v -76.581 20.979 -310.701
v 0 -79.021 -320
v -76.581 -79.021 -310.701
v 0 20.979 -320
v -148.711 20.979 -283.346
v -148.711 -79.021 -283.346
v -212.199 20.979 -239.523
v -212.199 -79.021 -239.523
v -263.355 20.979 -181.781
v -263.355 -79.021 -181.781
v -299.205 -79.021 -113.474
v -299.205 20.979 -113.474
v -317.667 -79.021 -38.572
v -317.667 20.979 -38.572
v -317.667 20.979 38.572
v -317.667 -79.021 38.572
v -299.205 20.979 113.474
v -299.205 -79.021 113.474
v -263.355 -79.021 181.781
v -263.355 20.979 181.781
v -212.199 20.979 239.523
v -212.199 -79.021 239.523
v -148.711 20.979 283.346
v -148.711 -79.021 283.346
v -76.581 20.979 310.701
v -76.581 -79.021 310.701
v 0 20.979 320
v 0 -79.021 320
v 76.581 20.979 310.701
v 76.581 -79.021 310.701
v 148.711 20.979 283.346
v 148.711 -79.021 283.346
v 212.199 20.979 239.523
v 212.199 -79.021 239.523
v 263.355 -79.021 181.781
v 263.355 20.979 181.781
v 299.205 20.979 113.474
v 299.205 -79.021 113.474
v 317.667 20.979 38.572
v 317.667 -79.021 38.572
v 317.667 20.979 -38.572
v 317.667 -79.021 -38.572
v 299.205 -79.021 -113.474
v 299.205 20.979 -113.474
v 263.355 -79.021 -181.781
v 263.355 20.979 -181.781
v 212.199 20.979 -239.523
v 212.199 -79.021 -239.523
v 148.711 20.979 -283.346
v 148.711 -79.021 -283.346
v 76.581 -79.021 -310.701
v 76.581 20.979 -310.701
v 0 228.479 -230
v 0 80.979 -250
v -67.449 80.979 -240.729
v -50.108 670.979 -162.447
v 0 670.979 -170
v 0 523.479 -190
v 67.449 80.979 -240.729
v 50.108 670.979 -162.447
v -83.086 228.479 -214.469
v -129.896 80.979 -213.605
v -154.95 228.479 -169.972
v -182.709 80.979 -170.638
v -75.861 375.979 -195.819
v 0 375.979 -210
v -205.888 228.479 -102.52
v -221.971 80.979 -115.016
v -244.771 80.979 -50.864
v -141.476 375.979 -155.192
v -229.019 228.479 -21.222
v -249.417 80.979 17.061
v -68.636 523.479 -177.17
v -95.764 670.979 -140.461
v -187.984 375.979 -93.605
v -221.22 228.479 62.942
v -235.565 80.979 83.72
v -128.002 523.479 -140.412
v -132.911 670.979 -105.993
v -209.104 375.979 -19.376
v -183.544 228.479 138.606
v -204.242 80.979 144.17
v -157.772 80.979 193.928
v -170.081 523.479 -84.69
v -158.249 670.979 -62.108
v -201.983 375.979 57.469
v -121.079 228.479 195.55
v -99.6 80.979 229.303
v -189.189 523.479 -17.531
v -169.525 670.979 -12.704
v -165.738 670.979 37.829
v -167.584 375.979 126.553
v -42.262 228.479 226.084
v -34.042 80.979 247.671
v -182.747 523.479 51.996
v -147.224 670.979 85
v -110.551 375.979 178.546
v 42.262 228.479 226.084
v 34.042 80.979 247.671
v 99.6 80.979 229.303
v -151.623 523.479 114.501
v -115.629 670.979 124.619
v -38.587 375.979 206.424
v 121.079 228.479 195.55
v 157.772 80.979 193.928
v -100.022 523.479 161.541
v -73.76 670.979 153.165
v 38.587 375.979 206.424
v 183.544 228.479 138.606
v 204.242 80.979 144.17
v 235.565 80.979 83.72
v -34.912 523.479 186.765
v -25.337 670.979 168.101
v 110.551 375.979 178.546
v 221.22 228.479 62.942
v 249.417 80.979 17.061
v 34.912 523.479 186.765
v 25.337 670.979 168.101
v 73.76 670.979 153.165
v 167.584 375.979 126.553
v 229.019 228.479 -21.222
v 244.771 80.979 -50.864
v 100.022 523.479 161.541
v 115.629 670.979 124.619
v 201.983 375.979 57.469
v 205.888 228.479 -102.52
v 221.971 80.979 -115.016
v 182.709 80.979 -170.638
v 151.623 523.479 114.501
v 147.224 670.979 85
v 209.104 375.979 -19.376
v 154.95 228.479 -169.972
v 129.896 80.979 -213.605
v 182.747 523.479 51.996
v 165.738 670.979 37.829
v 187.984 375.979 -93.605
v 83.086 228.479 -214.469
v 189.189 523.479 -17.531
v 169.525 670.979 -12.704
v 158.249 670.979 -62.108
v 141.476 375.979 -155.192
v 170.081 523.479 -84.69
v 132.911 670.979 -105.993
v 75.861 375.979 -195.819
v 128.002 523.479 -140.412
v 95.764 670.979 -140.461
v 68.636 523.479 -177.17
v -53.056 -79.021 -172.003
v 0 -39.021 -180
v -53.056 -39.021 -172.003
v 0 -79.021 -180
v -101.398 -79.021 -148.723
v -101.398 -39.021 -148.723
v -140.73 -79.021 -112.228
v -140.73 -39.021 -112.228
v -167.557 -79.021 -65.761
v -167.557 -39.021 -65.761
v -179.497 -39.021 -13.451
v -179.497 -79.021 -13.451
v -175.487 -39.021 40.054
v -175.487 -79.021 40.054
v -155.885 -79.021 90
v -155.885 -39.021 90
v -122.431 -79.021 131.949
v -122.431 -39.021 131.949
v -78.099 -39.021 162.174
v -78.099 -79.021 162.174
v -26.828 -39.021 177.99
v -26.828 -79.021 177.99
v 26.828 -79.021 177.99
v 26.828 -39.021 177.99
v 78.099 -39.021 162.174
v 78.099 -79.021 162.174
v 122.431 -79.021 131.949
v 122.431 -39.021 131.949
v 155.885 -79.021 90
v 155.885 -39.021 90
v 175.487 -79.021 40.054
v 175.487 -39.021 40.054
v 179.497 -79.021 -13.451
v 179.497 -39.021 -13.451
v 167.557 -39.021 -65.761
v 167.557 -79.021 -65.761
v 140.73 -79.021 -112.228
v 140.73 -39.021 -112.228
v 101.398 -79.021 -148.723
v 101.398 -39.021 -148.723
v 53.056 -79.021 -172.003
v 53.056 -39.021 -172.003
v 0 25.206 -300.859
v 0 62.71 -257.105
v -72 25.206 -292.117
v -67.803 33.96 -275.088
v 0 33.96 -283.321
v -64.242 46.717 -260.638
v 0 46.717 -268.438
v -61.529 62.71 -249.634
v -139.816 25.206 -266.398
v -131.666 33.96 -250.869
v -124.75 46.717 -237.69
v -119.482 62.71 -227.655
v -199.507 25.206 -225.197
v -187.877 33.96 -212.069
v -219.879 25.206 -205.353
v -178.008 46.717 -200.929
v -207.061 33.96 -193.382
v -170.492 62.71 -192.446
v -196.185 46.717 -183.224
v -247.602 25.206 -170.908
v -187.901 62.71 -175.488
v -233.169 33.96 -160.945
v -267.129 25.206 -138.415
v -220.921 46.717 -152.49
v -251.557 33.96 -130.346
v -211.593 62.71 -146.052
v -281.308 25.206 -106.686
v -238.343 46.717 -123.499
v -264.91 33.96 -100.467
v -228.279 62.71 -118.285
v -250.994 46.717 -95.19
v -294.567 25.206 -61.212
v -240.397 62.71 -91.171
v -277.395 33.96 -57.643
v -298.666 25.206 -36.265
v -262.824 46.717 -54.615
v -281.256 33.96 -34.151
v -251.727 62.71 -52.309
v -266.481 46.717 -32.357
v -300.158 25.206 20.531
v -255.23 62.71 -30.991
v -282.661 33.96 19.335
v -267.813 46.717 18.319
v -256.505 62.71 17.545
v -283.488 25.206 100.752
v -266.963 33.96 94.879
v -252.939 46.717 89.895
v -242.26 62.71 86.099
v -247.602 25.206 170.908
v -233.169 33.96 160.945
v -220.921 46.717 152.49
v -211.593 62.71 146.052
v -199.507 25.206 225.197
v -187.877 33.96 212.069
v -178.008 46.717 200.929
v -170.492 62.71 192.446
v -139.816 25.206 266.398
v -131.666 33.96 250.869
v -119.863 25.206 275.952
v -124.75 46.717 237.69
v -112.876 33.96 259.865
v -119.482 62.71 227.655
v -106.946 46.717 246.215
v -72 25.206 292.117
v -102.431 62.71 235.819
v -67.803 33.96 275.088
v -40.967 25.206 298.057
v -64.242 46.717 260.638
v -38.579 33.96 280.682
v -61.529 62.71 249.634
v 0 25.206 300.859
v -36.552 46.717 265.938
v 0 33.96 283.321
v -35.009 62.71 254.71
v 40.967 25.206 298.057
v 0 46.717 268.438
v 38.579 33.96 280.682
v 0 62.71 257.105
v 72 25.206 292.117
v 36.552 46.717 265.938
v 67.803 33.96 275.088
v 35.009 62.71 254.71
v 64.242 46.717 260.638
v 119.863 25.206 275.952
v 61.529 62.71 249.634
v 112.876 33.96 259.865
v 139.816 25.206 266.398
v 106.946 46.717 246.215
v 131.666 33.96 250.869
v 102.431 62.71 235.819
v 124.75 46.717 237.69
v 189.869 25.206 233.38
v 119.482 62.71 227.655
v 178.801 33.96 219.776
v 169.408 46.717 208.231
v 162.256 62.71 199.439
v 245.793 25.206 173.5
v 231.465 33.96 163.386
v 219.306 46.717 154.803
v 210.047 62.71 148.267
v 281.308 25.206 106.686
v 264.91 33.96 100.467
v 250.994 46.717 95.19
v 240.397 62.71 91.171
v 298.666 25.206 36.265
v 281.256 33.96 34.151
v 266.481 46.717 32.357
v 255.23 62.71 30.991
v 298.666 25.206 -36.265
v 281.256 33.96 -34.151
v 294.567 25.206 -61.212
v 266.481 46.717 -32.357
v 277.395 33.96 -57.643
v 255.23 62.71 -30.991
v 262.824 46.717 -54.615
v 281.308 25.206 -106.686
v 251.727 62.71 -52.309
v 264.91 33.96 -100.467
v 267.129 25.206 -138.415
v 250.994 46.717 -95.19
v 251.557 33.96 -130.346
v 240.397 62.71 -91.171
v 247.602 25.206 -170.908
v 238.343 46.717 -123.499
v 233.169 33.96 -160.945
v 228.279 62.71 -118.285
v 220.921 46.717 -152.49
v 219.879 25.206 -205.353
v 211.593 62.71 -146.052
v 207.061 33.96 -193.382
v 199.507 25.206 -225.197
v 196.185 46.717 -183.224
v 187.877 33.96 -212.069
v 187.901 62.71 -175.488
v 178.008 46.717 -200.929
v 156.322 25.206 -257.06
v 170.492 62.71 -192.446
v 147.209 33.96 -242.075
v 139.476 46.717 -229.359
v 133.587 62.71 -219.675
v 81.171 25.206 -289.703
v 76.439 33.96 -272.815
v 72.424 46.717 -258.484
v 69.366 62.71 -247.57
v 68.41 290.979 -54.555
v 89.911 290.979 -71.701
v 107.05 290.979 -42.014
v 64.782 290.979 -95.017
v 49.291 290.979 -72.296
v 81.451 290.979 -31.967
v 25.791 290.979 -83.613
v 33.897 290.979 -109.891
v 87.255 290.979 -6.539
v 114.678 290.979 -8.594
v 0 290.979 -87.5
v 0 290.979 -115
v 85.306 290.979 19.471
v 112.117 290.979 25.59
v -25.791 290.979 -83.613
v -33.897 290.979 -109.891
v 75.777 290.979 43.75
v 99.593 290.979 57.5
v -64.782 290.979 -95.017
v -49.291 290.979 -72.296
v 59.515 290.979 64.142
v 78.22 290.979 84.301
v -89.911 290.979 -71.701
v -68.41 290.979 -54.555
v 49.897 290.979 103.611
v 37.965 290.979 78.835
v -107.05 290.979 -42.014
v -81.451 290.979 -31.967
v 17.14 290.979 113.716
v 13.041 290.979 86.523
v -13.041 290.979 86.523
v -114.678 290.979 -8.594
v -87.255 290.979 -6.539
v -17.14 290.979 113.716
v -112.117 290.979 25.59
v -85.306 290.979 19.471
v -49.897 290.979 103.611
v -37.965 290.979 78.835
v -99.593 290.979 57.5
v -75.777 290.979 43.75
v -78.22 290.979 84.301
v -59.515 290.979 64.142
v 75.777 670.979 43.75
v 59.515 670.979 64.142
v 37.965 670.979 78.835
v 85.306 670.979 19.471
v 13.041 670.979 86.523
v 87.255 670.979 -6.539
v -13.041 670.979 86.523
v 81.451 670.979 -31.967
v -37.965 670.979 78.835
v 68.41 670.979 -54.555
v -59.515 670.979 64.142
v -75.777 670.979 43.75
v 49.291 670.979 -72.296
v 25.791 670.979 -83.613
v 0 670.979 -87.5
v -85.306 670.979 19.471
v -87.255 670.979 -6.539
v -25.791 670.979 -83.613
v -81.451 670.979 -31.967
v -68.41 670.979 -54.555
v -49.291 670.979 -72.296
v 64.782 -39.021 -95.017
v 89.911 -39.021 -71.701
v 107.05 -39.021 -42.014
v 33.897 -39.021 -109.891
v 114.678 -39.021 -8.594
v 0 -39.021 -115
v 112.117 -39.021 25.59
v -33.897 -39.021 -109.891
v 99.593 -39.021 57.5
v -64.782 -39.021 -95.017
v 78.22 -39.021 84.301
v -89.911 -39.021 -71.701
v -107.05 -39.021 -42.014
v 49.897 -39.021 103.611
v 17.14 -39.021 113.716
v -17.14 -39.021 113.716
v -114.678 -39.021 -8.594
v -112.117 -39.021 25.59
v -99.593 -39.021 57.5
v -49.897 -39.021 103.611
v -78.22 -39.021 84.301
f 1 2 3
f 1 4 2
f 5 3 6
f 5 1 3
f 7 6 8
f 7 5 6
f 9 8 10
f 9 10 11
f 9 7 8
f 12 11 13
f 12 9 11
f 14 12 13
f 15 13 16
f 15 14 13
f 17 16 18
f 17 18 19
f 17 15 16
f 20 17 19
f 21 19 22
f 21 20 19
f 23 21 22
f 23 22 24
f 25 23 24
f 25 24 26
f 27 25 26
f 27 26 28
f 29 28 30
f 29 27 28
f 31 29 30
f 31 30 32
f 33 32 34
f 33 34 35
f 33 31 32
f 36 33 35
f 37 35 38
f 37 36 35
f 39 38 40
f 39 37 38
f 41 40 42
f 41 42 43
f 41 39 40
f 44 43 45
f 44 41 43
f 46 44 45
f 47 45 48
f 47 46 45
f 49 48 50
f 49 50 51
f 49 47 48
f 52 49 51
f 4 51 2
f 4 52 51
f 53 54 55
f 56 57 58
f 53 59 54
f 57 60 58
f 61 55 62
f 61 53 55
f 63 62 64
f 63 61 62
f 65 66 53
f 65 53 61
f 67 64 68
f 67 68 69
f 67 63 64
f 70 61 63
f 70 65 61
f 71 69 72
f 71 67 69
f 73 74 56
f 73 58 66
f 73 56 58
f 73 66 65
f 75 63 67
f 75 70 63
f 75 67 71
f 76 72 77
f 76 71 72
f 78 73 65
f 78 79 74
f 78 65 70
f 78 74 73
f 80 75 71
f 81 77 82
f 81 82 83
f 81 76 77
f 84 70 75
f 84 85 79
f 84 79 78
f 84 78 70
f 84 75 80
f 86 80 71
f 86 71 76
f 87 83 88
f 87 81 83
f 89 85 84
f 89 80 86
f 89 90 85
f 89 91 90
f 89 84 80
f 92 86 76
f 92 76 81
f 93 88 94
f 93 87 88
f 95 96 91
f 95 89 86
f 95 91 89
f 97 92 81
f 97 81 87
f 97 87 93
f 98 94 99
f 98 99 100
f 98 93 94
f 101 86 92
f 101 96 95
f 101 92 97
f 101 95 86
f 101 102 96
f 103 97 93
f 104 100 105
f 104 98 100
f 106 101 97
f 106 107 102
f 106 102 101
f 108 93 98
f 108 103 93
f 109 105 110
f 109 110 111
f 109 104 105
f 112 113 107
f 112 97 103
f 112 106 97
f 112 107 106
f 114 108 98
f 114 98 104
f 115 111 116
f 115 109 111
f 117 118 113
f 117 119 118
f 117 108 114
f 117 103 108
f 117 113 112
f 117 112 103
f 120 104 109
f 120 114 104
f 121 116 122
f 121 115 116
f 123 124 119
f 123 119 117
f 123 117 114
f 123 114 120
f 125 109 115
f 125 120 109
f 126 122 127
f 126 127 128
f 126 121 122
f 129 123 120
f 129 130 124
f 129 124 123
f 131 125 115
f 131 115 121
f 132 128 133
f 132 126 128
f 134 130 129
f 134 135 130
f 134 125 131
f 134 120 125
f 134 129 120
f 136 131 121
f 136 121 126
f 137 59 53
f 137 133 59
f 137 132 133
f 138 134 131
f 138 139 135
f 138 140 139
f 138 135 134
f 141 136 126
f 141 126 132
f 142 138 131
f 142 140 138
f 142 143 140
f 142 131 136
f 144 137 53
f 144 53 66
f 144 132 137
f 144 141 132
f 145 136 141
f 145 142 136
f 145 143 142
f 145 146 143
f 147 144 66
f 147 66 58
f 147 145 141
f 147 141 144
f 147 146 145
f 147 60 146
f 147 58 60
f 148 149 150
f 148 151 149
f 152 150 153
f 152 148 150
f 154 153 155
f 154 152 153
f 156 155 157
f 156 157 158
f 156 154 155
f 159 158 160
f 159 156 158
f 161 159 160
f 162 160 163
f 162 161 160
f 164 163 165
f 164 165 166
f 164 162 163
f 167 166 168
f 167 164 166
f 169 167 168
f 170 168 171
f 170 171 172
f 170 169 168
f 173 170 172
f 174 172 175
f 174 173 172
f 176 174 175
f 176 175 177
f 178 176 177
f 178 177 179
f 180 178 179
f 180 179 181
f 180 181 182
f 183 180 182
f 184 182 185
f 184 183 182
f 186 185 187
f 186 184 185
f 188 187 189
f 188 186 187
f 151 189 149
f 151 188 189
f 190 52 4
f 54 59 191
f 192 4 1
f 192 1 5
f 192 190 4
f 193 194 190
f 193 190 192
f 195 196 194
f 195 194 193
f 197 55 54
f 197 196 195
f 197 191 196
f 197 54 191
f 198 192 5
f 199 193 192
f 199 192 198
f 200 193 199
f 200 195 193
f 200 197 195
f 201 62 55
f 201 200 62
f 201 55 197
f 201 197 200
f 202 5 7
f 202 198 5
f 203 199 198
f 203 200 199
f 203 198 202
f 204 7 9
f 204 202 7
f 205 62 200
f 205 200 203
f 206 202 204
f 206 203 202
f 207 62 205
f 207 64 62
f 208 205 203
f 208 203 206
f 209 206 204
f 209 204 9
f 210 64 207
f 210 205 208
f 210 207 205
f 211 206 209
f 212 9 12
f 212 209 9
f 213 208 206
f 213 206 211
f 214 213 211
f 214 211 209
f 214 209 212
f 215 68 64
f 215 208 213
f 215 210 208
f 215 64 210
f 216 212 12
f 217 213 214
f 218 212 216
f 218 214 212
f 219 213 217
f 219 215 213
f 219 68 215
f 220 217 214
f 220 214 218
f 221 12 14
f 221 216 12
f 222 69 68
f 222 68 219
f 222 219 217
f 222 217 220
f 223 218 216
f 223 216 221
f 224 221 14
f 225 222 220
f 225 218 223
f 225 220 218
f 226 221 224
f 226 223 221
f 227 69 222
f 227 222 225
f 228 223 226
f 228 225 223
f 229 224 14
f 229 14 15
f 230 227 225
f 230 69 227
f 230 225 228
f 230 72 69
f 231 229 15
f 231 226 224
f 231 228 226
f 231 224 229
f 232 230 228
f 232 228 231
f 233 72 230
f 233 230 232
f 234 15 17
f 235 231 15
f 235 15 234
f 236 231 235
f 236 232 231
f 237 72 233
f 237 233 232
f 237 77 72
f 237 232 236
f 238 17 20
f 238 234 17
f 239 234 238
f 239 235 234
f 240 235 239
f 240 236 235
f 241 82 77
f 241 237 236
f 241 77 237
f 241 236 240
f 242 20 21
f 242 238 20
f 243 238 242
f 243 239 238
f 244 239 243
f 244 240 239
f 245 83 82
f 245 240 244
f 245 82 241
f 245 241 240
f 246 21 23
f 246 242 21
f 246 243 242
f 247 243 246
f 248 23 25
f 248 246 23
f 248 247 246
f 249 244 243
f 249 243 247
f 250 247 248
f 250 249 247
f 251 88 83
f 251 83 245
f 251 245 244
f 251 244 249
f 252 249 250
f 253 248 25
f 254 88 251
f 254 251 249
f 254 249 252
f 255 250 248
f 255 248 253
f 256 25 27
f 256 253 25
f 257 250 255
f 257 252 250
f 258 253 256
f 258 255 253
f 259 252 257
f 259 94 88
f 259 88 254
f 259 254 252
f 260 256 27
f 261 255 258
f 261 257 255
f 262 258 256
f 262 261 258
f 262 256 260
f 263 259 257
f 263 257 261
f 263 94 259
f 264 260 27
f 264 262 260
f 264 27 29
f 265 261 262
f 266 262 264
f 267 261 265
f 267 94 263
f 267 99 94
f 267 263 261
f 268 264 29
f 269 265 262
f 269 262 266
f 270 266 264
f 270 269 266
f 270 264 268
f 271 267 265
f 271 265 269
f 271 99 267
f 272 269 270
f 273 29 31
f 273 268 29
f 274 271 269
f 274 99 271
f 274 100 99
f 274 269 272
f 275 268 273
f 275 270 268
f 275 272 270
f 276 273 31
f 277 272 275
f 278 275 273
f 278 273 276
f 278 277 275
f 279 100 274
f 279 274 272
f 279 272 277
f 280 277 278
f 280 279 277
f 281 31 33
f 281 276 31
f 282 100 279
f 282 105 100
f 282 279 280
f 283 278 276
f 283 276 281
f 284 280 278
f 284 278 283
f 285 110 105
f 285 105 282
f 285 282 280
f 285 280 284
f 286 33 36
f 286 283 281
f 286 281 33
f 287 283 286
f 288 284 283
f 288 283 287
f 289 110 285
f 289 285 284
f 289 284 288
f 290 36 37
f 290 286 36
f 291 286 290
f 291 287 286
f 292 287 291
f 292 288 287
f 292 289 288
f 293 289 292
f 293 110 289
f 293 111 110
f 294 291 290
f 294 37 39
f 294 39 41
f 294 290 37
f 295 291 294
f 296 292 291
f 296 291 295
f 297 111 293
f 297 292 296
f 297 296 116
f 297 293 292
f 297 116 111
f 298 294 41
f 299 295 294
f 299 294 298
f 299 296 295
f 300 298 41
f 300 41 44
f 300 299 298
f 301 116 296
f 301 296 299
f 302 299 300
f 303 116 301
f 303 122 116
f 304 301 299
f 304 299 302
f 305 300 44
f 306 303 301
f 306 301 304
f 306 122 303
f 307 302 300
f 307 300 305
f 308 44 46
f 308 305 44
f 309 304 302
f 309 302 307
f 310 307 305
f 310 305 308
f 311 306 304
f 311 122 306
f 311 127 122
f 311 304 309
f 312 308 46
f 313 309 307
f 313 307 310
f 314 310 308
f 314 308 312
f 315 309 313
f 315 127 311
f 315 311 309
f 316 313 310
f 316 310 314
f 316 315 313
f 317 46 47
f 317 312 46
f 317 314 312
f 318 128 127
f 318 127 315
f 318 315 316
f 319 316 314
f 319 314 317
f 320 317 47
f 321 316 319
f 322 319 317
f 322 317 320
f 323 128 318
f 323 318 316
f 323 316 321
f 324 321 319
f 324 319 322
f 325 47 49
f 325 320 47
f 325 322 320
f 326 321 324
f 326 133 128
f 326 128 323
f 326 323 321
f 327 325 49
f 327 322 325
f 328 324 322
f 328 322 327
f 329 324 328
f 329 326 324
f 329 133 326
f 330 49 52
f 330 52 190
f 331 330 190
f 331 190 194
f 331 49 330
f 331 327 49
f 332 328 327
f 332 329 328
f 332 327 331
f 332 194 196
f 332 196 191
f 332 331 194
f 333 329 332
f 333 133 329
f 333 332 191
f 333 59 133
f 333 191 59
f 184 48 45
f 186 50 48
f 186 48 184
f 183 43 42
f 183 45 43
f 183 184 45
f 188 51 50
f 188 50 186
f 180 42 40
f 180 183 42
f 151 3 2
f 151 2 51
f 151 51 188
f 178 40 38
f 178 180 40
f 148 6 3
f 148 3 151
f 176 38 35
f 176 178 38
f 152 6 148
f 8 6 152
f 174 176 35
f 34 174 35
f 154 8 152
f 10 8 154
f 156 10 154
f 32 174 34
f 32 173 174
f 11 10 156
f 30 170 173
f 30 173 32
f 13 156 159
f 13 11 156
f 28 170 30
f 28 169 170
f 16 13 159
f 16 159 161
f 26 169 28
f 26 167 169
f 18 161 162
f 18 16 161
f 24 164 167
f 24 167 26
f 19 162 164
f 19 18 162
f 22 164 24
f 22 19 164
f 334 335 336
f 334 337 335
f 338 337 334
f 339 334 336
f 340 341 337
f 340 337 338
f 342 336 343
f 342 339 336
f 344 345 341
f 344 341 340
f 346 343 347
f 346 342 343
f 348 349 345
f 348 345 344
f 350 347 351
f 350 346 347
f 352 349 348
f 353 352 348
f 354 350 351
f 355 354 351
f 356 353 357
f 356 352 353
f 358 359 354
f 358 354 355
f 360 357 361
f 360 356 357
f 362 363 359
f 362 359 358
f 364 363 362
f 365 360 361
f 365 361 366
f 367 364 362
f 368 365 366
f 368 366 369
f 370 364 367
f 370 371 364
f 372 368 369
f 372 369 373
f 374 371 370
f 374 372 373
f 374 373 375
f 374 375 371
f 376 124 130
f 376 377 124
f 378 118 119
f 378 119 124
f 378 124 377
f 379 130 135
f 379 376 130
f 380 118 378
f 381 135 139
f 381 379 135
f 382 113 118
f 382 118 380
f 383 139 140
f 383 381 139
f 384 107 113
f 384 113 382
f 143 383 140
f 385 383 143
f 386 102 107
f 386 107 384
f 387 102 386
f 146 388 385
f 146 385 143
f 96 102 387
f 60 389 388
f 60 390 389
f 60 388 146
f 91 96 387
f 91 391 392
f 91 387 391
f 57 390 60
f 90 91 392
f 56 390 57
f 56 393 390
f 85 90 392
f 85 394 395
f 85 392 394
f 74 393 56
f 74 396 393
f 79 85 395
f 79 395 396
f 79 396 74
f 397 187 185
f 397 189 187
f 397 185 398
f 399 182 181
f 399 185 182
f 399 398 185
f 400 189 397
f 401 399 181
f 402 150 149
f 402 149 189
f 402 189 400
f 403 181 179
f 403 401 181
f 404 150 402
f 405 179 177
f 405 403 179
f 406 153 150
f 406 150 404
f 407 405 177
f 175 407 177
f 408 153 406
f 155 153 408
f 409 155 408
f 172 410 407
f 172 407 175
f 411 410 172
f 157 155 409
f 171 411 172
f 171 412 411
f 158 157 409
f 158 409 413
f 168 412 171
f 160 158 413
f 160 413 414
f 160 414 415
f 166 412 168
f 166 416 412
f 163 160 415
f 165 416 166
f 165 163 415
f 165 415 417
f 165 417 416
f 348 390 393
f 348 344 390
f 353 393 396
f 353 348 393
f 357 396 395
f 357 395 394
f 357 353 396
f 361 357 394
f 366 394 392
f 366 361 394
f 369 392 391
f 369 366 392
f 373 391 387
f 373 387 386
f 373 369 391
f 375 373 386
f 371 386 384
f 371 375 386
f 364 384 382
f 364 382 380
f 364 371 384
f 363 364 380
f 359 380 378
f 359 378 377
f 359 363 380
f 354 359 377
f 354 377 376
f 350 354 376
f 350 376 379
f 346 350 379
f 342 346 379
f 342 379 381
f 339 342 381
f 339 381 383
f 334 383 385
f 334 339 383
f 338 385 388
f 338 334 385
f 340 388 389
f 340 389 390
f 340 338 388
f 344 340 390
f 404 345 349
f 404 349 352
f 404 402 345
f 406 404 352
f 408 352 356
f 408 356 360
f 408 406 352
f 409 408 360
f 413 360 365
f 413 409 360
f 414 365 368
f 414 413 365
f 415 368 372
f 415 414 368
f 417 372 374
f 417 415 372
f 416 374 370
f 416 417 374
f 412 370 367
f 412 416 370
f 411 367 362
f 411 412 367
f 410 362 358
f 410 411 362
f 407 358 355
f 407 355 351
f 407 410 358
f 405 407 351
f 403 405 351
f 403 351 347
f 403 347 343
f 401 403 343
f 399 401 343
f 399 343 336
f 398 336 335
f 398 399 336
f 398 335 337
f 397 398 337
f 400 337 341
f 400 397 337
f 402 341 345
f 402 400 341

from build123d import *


with BuildPart() as part:
    # Esquisse1 → Révolution1 (revolve)
    with BuildSketch(Plane.XY, mode=Mode.PRIVATE) as r_volution1_sk:
        Polygon((115, 80.978839747), (250, 80.978839747), (170, 670.978839747), (87.5, 670.978839747), (87.5, 290.978839747), (115, 290.978839747), align=None)
        with BuildLine():
            Line((115, 20.978839747), (320, 20.978839747))
            ThreePointArc((320, 20.978839747), (275.487697577, 39.881153587), (250, 80.978839747))
            Line((250, 80.978839747), (115, 80.978839747))
            Line((115, 80.978839747), (115, 20.978839747))
        make_face()
        Polygon((180, -39.021160253), (180, -79.021160253), (320, -79.021160253), (320, 20.978839747), (115, 20.978839747), (115, -39.021160253), align=None)
    revolve(r_volution1_sk.sketch.rotate(Axis((0, -112.379494544, 0), (0, 1, 0)), 90), axis=Axis((0, -112.379494544, 0), (0, 1, 0)))


solid = part.part
